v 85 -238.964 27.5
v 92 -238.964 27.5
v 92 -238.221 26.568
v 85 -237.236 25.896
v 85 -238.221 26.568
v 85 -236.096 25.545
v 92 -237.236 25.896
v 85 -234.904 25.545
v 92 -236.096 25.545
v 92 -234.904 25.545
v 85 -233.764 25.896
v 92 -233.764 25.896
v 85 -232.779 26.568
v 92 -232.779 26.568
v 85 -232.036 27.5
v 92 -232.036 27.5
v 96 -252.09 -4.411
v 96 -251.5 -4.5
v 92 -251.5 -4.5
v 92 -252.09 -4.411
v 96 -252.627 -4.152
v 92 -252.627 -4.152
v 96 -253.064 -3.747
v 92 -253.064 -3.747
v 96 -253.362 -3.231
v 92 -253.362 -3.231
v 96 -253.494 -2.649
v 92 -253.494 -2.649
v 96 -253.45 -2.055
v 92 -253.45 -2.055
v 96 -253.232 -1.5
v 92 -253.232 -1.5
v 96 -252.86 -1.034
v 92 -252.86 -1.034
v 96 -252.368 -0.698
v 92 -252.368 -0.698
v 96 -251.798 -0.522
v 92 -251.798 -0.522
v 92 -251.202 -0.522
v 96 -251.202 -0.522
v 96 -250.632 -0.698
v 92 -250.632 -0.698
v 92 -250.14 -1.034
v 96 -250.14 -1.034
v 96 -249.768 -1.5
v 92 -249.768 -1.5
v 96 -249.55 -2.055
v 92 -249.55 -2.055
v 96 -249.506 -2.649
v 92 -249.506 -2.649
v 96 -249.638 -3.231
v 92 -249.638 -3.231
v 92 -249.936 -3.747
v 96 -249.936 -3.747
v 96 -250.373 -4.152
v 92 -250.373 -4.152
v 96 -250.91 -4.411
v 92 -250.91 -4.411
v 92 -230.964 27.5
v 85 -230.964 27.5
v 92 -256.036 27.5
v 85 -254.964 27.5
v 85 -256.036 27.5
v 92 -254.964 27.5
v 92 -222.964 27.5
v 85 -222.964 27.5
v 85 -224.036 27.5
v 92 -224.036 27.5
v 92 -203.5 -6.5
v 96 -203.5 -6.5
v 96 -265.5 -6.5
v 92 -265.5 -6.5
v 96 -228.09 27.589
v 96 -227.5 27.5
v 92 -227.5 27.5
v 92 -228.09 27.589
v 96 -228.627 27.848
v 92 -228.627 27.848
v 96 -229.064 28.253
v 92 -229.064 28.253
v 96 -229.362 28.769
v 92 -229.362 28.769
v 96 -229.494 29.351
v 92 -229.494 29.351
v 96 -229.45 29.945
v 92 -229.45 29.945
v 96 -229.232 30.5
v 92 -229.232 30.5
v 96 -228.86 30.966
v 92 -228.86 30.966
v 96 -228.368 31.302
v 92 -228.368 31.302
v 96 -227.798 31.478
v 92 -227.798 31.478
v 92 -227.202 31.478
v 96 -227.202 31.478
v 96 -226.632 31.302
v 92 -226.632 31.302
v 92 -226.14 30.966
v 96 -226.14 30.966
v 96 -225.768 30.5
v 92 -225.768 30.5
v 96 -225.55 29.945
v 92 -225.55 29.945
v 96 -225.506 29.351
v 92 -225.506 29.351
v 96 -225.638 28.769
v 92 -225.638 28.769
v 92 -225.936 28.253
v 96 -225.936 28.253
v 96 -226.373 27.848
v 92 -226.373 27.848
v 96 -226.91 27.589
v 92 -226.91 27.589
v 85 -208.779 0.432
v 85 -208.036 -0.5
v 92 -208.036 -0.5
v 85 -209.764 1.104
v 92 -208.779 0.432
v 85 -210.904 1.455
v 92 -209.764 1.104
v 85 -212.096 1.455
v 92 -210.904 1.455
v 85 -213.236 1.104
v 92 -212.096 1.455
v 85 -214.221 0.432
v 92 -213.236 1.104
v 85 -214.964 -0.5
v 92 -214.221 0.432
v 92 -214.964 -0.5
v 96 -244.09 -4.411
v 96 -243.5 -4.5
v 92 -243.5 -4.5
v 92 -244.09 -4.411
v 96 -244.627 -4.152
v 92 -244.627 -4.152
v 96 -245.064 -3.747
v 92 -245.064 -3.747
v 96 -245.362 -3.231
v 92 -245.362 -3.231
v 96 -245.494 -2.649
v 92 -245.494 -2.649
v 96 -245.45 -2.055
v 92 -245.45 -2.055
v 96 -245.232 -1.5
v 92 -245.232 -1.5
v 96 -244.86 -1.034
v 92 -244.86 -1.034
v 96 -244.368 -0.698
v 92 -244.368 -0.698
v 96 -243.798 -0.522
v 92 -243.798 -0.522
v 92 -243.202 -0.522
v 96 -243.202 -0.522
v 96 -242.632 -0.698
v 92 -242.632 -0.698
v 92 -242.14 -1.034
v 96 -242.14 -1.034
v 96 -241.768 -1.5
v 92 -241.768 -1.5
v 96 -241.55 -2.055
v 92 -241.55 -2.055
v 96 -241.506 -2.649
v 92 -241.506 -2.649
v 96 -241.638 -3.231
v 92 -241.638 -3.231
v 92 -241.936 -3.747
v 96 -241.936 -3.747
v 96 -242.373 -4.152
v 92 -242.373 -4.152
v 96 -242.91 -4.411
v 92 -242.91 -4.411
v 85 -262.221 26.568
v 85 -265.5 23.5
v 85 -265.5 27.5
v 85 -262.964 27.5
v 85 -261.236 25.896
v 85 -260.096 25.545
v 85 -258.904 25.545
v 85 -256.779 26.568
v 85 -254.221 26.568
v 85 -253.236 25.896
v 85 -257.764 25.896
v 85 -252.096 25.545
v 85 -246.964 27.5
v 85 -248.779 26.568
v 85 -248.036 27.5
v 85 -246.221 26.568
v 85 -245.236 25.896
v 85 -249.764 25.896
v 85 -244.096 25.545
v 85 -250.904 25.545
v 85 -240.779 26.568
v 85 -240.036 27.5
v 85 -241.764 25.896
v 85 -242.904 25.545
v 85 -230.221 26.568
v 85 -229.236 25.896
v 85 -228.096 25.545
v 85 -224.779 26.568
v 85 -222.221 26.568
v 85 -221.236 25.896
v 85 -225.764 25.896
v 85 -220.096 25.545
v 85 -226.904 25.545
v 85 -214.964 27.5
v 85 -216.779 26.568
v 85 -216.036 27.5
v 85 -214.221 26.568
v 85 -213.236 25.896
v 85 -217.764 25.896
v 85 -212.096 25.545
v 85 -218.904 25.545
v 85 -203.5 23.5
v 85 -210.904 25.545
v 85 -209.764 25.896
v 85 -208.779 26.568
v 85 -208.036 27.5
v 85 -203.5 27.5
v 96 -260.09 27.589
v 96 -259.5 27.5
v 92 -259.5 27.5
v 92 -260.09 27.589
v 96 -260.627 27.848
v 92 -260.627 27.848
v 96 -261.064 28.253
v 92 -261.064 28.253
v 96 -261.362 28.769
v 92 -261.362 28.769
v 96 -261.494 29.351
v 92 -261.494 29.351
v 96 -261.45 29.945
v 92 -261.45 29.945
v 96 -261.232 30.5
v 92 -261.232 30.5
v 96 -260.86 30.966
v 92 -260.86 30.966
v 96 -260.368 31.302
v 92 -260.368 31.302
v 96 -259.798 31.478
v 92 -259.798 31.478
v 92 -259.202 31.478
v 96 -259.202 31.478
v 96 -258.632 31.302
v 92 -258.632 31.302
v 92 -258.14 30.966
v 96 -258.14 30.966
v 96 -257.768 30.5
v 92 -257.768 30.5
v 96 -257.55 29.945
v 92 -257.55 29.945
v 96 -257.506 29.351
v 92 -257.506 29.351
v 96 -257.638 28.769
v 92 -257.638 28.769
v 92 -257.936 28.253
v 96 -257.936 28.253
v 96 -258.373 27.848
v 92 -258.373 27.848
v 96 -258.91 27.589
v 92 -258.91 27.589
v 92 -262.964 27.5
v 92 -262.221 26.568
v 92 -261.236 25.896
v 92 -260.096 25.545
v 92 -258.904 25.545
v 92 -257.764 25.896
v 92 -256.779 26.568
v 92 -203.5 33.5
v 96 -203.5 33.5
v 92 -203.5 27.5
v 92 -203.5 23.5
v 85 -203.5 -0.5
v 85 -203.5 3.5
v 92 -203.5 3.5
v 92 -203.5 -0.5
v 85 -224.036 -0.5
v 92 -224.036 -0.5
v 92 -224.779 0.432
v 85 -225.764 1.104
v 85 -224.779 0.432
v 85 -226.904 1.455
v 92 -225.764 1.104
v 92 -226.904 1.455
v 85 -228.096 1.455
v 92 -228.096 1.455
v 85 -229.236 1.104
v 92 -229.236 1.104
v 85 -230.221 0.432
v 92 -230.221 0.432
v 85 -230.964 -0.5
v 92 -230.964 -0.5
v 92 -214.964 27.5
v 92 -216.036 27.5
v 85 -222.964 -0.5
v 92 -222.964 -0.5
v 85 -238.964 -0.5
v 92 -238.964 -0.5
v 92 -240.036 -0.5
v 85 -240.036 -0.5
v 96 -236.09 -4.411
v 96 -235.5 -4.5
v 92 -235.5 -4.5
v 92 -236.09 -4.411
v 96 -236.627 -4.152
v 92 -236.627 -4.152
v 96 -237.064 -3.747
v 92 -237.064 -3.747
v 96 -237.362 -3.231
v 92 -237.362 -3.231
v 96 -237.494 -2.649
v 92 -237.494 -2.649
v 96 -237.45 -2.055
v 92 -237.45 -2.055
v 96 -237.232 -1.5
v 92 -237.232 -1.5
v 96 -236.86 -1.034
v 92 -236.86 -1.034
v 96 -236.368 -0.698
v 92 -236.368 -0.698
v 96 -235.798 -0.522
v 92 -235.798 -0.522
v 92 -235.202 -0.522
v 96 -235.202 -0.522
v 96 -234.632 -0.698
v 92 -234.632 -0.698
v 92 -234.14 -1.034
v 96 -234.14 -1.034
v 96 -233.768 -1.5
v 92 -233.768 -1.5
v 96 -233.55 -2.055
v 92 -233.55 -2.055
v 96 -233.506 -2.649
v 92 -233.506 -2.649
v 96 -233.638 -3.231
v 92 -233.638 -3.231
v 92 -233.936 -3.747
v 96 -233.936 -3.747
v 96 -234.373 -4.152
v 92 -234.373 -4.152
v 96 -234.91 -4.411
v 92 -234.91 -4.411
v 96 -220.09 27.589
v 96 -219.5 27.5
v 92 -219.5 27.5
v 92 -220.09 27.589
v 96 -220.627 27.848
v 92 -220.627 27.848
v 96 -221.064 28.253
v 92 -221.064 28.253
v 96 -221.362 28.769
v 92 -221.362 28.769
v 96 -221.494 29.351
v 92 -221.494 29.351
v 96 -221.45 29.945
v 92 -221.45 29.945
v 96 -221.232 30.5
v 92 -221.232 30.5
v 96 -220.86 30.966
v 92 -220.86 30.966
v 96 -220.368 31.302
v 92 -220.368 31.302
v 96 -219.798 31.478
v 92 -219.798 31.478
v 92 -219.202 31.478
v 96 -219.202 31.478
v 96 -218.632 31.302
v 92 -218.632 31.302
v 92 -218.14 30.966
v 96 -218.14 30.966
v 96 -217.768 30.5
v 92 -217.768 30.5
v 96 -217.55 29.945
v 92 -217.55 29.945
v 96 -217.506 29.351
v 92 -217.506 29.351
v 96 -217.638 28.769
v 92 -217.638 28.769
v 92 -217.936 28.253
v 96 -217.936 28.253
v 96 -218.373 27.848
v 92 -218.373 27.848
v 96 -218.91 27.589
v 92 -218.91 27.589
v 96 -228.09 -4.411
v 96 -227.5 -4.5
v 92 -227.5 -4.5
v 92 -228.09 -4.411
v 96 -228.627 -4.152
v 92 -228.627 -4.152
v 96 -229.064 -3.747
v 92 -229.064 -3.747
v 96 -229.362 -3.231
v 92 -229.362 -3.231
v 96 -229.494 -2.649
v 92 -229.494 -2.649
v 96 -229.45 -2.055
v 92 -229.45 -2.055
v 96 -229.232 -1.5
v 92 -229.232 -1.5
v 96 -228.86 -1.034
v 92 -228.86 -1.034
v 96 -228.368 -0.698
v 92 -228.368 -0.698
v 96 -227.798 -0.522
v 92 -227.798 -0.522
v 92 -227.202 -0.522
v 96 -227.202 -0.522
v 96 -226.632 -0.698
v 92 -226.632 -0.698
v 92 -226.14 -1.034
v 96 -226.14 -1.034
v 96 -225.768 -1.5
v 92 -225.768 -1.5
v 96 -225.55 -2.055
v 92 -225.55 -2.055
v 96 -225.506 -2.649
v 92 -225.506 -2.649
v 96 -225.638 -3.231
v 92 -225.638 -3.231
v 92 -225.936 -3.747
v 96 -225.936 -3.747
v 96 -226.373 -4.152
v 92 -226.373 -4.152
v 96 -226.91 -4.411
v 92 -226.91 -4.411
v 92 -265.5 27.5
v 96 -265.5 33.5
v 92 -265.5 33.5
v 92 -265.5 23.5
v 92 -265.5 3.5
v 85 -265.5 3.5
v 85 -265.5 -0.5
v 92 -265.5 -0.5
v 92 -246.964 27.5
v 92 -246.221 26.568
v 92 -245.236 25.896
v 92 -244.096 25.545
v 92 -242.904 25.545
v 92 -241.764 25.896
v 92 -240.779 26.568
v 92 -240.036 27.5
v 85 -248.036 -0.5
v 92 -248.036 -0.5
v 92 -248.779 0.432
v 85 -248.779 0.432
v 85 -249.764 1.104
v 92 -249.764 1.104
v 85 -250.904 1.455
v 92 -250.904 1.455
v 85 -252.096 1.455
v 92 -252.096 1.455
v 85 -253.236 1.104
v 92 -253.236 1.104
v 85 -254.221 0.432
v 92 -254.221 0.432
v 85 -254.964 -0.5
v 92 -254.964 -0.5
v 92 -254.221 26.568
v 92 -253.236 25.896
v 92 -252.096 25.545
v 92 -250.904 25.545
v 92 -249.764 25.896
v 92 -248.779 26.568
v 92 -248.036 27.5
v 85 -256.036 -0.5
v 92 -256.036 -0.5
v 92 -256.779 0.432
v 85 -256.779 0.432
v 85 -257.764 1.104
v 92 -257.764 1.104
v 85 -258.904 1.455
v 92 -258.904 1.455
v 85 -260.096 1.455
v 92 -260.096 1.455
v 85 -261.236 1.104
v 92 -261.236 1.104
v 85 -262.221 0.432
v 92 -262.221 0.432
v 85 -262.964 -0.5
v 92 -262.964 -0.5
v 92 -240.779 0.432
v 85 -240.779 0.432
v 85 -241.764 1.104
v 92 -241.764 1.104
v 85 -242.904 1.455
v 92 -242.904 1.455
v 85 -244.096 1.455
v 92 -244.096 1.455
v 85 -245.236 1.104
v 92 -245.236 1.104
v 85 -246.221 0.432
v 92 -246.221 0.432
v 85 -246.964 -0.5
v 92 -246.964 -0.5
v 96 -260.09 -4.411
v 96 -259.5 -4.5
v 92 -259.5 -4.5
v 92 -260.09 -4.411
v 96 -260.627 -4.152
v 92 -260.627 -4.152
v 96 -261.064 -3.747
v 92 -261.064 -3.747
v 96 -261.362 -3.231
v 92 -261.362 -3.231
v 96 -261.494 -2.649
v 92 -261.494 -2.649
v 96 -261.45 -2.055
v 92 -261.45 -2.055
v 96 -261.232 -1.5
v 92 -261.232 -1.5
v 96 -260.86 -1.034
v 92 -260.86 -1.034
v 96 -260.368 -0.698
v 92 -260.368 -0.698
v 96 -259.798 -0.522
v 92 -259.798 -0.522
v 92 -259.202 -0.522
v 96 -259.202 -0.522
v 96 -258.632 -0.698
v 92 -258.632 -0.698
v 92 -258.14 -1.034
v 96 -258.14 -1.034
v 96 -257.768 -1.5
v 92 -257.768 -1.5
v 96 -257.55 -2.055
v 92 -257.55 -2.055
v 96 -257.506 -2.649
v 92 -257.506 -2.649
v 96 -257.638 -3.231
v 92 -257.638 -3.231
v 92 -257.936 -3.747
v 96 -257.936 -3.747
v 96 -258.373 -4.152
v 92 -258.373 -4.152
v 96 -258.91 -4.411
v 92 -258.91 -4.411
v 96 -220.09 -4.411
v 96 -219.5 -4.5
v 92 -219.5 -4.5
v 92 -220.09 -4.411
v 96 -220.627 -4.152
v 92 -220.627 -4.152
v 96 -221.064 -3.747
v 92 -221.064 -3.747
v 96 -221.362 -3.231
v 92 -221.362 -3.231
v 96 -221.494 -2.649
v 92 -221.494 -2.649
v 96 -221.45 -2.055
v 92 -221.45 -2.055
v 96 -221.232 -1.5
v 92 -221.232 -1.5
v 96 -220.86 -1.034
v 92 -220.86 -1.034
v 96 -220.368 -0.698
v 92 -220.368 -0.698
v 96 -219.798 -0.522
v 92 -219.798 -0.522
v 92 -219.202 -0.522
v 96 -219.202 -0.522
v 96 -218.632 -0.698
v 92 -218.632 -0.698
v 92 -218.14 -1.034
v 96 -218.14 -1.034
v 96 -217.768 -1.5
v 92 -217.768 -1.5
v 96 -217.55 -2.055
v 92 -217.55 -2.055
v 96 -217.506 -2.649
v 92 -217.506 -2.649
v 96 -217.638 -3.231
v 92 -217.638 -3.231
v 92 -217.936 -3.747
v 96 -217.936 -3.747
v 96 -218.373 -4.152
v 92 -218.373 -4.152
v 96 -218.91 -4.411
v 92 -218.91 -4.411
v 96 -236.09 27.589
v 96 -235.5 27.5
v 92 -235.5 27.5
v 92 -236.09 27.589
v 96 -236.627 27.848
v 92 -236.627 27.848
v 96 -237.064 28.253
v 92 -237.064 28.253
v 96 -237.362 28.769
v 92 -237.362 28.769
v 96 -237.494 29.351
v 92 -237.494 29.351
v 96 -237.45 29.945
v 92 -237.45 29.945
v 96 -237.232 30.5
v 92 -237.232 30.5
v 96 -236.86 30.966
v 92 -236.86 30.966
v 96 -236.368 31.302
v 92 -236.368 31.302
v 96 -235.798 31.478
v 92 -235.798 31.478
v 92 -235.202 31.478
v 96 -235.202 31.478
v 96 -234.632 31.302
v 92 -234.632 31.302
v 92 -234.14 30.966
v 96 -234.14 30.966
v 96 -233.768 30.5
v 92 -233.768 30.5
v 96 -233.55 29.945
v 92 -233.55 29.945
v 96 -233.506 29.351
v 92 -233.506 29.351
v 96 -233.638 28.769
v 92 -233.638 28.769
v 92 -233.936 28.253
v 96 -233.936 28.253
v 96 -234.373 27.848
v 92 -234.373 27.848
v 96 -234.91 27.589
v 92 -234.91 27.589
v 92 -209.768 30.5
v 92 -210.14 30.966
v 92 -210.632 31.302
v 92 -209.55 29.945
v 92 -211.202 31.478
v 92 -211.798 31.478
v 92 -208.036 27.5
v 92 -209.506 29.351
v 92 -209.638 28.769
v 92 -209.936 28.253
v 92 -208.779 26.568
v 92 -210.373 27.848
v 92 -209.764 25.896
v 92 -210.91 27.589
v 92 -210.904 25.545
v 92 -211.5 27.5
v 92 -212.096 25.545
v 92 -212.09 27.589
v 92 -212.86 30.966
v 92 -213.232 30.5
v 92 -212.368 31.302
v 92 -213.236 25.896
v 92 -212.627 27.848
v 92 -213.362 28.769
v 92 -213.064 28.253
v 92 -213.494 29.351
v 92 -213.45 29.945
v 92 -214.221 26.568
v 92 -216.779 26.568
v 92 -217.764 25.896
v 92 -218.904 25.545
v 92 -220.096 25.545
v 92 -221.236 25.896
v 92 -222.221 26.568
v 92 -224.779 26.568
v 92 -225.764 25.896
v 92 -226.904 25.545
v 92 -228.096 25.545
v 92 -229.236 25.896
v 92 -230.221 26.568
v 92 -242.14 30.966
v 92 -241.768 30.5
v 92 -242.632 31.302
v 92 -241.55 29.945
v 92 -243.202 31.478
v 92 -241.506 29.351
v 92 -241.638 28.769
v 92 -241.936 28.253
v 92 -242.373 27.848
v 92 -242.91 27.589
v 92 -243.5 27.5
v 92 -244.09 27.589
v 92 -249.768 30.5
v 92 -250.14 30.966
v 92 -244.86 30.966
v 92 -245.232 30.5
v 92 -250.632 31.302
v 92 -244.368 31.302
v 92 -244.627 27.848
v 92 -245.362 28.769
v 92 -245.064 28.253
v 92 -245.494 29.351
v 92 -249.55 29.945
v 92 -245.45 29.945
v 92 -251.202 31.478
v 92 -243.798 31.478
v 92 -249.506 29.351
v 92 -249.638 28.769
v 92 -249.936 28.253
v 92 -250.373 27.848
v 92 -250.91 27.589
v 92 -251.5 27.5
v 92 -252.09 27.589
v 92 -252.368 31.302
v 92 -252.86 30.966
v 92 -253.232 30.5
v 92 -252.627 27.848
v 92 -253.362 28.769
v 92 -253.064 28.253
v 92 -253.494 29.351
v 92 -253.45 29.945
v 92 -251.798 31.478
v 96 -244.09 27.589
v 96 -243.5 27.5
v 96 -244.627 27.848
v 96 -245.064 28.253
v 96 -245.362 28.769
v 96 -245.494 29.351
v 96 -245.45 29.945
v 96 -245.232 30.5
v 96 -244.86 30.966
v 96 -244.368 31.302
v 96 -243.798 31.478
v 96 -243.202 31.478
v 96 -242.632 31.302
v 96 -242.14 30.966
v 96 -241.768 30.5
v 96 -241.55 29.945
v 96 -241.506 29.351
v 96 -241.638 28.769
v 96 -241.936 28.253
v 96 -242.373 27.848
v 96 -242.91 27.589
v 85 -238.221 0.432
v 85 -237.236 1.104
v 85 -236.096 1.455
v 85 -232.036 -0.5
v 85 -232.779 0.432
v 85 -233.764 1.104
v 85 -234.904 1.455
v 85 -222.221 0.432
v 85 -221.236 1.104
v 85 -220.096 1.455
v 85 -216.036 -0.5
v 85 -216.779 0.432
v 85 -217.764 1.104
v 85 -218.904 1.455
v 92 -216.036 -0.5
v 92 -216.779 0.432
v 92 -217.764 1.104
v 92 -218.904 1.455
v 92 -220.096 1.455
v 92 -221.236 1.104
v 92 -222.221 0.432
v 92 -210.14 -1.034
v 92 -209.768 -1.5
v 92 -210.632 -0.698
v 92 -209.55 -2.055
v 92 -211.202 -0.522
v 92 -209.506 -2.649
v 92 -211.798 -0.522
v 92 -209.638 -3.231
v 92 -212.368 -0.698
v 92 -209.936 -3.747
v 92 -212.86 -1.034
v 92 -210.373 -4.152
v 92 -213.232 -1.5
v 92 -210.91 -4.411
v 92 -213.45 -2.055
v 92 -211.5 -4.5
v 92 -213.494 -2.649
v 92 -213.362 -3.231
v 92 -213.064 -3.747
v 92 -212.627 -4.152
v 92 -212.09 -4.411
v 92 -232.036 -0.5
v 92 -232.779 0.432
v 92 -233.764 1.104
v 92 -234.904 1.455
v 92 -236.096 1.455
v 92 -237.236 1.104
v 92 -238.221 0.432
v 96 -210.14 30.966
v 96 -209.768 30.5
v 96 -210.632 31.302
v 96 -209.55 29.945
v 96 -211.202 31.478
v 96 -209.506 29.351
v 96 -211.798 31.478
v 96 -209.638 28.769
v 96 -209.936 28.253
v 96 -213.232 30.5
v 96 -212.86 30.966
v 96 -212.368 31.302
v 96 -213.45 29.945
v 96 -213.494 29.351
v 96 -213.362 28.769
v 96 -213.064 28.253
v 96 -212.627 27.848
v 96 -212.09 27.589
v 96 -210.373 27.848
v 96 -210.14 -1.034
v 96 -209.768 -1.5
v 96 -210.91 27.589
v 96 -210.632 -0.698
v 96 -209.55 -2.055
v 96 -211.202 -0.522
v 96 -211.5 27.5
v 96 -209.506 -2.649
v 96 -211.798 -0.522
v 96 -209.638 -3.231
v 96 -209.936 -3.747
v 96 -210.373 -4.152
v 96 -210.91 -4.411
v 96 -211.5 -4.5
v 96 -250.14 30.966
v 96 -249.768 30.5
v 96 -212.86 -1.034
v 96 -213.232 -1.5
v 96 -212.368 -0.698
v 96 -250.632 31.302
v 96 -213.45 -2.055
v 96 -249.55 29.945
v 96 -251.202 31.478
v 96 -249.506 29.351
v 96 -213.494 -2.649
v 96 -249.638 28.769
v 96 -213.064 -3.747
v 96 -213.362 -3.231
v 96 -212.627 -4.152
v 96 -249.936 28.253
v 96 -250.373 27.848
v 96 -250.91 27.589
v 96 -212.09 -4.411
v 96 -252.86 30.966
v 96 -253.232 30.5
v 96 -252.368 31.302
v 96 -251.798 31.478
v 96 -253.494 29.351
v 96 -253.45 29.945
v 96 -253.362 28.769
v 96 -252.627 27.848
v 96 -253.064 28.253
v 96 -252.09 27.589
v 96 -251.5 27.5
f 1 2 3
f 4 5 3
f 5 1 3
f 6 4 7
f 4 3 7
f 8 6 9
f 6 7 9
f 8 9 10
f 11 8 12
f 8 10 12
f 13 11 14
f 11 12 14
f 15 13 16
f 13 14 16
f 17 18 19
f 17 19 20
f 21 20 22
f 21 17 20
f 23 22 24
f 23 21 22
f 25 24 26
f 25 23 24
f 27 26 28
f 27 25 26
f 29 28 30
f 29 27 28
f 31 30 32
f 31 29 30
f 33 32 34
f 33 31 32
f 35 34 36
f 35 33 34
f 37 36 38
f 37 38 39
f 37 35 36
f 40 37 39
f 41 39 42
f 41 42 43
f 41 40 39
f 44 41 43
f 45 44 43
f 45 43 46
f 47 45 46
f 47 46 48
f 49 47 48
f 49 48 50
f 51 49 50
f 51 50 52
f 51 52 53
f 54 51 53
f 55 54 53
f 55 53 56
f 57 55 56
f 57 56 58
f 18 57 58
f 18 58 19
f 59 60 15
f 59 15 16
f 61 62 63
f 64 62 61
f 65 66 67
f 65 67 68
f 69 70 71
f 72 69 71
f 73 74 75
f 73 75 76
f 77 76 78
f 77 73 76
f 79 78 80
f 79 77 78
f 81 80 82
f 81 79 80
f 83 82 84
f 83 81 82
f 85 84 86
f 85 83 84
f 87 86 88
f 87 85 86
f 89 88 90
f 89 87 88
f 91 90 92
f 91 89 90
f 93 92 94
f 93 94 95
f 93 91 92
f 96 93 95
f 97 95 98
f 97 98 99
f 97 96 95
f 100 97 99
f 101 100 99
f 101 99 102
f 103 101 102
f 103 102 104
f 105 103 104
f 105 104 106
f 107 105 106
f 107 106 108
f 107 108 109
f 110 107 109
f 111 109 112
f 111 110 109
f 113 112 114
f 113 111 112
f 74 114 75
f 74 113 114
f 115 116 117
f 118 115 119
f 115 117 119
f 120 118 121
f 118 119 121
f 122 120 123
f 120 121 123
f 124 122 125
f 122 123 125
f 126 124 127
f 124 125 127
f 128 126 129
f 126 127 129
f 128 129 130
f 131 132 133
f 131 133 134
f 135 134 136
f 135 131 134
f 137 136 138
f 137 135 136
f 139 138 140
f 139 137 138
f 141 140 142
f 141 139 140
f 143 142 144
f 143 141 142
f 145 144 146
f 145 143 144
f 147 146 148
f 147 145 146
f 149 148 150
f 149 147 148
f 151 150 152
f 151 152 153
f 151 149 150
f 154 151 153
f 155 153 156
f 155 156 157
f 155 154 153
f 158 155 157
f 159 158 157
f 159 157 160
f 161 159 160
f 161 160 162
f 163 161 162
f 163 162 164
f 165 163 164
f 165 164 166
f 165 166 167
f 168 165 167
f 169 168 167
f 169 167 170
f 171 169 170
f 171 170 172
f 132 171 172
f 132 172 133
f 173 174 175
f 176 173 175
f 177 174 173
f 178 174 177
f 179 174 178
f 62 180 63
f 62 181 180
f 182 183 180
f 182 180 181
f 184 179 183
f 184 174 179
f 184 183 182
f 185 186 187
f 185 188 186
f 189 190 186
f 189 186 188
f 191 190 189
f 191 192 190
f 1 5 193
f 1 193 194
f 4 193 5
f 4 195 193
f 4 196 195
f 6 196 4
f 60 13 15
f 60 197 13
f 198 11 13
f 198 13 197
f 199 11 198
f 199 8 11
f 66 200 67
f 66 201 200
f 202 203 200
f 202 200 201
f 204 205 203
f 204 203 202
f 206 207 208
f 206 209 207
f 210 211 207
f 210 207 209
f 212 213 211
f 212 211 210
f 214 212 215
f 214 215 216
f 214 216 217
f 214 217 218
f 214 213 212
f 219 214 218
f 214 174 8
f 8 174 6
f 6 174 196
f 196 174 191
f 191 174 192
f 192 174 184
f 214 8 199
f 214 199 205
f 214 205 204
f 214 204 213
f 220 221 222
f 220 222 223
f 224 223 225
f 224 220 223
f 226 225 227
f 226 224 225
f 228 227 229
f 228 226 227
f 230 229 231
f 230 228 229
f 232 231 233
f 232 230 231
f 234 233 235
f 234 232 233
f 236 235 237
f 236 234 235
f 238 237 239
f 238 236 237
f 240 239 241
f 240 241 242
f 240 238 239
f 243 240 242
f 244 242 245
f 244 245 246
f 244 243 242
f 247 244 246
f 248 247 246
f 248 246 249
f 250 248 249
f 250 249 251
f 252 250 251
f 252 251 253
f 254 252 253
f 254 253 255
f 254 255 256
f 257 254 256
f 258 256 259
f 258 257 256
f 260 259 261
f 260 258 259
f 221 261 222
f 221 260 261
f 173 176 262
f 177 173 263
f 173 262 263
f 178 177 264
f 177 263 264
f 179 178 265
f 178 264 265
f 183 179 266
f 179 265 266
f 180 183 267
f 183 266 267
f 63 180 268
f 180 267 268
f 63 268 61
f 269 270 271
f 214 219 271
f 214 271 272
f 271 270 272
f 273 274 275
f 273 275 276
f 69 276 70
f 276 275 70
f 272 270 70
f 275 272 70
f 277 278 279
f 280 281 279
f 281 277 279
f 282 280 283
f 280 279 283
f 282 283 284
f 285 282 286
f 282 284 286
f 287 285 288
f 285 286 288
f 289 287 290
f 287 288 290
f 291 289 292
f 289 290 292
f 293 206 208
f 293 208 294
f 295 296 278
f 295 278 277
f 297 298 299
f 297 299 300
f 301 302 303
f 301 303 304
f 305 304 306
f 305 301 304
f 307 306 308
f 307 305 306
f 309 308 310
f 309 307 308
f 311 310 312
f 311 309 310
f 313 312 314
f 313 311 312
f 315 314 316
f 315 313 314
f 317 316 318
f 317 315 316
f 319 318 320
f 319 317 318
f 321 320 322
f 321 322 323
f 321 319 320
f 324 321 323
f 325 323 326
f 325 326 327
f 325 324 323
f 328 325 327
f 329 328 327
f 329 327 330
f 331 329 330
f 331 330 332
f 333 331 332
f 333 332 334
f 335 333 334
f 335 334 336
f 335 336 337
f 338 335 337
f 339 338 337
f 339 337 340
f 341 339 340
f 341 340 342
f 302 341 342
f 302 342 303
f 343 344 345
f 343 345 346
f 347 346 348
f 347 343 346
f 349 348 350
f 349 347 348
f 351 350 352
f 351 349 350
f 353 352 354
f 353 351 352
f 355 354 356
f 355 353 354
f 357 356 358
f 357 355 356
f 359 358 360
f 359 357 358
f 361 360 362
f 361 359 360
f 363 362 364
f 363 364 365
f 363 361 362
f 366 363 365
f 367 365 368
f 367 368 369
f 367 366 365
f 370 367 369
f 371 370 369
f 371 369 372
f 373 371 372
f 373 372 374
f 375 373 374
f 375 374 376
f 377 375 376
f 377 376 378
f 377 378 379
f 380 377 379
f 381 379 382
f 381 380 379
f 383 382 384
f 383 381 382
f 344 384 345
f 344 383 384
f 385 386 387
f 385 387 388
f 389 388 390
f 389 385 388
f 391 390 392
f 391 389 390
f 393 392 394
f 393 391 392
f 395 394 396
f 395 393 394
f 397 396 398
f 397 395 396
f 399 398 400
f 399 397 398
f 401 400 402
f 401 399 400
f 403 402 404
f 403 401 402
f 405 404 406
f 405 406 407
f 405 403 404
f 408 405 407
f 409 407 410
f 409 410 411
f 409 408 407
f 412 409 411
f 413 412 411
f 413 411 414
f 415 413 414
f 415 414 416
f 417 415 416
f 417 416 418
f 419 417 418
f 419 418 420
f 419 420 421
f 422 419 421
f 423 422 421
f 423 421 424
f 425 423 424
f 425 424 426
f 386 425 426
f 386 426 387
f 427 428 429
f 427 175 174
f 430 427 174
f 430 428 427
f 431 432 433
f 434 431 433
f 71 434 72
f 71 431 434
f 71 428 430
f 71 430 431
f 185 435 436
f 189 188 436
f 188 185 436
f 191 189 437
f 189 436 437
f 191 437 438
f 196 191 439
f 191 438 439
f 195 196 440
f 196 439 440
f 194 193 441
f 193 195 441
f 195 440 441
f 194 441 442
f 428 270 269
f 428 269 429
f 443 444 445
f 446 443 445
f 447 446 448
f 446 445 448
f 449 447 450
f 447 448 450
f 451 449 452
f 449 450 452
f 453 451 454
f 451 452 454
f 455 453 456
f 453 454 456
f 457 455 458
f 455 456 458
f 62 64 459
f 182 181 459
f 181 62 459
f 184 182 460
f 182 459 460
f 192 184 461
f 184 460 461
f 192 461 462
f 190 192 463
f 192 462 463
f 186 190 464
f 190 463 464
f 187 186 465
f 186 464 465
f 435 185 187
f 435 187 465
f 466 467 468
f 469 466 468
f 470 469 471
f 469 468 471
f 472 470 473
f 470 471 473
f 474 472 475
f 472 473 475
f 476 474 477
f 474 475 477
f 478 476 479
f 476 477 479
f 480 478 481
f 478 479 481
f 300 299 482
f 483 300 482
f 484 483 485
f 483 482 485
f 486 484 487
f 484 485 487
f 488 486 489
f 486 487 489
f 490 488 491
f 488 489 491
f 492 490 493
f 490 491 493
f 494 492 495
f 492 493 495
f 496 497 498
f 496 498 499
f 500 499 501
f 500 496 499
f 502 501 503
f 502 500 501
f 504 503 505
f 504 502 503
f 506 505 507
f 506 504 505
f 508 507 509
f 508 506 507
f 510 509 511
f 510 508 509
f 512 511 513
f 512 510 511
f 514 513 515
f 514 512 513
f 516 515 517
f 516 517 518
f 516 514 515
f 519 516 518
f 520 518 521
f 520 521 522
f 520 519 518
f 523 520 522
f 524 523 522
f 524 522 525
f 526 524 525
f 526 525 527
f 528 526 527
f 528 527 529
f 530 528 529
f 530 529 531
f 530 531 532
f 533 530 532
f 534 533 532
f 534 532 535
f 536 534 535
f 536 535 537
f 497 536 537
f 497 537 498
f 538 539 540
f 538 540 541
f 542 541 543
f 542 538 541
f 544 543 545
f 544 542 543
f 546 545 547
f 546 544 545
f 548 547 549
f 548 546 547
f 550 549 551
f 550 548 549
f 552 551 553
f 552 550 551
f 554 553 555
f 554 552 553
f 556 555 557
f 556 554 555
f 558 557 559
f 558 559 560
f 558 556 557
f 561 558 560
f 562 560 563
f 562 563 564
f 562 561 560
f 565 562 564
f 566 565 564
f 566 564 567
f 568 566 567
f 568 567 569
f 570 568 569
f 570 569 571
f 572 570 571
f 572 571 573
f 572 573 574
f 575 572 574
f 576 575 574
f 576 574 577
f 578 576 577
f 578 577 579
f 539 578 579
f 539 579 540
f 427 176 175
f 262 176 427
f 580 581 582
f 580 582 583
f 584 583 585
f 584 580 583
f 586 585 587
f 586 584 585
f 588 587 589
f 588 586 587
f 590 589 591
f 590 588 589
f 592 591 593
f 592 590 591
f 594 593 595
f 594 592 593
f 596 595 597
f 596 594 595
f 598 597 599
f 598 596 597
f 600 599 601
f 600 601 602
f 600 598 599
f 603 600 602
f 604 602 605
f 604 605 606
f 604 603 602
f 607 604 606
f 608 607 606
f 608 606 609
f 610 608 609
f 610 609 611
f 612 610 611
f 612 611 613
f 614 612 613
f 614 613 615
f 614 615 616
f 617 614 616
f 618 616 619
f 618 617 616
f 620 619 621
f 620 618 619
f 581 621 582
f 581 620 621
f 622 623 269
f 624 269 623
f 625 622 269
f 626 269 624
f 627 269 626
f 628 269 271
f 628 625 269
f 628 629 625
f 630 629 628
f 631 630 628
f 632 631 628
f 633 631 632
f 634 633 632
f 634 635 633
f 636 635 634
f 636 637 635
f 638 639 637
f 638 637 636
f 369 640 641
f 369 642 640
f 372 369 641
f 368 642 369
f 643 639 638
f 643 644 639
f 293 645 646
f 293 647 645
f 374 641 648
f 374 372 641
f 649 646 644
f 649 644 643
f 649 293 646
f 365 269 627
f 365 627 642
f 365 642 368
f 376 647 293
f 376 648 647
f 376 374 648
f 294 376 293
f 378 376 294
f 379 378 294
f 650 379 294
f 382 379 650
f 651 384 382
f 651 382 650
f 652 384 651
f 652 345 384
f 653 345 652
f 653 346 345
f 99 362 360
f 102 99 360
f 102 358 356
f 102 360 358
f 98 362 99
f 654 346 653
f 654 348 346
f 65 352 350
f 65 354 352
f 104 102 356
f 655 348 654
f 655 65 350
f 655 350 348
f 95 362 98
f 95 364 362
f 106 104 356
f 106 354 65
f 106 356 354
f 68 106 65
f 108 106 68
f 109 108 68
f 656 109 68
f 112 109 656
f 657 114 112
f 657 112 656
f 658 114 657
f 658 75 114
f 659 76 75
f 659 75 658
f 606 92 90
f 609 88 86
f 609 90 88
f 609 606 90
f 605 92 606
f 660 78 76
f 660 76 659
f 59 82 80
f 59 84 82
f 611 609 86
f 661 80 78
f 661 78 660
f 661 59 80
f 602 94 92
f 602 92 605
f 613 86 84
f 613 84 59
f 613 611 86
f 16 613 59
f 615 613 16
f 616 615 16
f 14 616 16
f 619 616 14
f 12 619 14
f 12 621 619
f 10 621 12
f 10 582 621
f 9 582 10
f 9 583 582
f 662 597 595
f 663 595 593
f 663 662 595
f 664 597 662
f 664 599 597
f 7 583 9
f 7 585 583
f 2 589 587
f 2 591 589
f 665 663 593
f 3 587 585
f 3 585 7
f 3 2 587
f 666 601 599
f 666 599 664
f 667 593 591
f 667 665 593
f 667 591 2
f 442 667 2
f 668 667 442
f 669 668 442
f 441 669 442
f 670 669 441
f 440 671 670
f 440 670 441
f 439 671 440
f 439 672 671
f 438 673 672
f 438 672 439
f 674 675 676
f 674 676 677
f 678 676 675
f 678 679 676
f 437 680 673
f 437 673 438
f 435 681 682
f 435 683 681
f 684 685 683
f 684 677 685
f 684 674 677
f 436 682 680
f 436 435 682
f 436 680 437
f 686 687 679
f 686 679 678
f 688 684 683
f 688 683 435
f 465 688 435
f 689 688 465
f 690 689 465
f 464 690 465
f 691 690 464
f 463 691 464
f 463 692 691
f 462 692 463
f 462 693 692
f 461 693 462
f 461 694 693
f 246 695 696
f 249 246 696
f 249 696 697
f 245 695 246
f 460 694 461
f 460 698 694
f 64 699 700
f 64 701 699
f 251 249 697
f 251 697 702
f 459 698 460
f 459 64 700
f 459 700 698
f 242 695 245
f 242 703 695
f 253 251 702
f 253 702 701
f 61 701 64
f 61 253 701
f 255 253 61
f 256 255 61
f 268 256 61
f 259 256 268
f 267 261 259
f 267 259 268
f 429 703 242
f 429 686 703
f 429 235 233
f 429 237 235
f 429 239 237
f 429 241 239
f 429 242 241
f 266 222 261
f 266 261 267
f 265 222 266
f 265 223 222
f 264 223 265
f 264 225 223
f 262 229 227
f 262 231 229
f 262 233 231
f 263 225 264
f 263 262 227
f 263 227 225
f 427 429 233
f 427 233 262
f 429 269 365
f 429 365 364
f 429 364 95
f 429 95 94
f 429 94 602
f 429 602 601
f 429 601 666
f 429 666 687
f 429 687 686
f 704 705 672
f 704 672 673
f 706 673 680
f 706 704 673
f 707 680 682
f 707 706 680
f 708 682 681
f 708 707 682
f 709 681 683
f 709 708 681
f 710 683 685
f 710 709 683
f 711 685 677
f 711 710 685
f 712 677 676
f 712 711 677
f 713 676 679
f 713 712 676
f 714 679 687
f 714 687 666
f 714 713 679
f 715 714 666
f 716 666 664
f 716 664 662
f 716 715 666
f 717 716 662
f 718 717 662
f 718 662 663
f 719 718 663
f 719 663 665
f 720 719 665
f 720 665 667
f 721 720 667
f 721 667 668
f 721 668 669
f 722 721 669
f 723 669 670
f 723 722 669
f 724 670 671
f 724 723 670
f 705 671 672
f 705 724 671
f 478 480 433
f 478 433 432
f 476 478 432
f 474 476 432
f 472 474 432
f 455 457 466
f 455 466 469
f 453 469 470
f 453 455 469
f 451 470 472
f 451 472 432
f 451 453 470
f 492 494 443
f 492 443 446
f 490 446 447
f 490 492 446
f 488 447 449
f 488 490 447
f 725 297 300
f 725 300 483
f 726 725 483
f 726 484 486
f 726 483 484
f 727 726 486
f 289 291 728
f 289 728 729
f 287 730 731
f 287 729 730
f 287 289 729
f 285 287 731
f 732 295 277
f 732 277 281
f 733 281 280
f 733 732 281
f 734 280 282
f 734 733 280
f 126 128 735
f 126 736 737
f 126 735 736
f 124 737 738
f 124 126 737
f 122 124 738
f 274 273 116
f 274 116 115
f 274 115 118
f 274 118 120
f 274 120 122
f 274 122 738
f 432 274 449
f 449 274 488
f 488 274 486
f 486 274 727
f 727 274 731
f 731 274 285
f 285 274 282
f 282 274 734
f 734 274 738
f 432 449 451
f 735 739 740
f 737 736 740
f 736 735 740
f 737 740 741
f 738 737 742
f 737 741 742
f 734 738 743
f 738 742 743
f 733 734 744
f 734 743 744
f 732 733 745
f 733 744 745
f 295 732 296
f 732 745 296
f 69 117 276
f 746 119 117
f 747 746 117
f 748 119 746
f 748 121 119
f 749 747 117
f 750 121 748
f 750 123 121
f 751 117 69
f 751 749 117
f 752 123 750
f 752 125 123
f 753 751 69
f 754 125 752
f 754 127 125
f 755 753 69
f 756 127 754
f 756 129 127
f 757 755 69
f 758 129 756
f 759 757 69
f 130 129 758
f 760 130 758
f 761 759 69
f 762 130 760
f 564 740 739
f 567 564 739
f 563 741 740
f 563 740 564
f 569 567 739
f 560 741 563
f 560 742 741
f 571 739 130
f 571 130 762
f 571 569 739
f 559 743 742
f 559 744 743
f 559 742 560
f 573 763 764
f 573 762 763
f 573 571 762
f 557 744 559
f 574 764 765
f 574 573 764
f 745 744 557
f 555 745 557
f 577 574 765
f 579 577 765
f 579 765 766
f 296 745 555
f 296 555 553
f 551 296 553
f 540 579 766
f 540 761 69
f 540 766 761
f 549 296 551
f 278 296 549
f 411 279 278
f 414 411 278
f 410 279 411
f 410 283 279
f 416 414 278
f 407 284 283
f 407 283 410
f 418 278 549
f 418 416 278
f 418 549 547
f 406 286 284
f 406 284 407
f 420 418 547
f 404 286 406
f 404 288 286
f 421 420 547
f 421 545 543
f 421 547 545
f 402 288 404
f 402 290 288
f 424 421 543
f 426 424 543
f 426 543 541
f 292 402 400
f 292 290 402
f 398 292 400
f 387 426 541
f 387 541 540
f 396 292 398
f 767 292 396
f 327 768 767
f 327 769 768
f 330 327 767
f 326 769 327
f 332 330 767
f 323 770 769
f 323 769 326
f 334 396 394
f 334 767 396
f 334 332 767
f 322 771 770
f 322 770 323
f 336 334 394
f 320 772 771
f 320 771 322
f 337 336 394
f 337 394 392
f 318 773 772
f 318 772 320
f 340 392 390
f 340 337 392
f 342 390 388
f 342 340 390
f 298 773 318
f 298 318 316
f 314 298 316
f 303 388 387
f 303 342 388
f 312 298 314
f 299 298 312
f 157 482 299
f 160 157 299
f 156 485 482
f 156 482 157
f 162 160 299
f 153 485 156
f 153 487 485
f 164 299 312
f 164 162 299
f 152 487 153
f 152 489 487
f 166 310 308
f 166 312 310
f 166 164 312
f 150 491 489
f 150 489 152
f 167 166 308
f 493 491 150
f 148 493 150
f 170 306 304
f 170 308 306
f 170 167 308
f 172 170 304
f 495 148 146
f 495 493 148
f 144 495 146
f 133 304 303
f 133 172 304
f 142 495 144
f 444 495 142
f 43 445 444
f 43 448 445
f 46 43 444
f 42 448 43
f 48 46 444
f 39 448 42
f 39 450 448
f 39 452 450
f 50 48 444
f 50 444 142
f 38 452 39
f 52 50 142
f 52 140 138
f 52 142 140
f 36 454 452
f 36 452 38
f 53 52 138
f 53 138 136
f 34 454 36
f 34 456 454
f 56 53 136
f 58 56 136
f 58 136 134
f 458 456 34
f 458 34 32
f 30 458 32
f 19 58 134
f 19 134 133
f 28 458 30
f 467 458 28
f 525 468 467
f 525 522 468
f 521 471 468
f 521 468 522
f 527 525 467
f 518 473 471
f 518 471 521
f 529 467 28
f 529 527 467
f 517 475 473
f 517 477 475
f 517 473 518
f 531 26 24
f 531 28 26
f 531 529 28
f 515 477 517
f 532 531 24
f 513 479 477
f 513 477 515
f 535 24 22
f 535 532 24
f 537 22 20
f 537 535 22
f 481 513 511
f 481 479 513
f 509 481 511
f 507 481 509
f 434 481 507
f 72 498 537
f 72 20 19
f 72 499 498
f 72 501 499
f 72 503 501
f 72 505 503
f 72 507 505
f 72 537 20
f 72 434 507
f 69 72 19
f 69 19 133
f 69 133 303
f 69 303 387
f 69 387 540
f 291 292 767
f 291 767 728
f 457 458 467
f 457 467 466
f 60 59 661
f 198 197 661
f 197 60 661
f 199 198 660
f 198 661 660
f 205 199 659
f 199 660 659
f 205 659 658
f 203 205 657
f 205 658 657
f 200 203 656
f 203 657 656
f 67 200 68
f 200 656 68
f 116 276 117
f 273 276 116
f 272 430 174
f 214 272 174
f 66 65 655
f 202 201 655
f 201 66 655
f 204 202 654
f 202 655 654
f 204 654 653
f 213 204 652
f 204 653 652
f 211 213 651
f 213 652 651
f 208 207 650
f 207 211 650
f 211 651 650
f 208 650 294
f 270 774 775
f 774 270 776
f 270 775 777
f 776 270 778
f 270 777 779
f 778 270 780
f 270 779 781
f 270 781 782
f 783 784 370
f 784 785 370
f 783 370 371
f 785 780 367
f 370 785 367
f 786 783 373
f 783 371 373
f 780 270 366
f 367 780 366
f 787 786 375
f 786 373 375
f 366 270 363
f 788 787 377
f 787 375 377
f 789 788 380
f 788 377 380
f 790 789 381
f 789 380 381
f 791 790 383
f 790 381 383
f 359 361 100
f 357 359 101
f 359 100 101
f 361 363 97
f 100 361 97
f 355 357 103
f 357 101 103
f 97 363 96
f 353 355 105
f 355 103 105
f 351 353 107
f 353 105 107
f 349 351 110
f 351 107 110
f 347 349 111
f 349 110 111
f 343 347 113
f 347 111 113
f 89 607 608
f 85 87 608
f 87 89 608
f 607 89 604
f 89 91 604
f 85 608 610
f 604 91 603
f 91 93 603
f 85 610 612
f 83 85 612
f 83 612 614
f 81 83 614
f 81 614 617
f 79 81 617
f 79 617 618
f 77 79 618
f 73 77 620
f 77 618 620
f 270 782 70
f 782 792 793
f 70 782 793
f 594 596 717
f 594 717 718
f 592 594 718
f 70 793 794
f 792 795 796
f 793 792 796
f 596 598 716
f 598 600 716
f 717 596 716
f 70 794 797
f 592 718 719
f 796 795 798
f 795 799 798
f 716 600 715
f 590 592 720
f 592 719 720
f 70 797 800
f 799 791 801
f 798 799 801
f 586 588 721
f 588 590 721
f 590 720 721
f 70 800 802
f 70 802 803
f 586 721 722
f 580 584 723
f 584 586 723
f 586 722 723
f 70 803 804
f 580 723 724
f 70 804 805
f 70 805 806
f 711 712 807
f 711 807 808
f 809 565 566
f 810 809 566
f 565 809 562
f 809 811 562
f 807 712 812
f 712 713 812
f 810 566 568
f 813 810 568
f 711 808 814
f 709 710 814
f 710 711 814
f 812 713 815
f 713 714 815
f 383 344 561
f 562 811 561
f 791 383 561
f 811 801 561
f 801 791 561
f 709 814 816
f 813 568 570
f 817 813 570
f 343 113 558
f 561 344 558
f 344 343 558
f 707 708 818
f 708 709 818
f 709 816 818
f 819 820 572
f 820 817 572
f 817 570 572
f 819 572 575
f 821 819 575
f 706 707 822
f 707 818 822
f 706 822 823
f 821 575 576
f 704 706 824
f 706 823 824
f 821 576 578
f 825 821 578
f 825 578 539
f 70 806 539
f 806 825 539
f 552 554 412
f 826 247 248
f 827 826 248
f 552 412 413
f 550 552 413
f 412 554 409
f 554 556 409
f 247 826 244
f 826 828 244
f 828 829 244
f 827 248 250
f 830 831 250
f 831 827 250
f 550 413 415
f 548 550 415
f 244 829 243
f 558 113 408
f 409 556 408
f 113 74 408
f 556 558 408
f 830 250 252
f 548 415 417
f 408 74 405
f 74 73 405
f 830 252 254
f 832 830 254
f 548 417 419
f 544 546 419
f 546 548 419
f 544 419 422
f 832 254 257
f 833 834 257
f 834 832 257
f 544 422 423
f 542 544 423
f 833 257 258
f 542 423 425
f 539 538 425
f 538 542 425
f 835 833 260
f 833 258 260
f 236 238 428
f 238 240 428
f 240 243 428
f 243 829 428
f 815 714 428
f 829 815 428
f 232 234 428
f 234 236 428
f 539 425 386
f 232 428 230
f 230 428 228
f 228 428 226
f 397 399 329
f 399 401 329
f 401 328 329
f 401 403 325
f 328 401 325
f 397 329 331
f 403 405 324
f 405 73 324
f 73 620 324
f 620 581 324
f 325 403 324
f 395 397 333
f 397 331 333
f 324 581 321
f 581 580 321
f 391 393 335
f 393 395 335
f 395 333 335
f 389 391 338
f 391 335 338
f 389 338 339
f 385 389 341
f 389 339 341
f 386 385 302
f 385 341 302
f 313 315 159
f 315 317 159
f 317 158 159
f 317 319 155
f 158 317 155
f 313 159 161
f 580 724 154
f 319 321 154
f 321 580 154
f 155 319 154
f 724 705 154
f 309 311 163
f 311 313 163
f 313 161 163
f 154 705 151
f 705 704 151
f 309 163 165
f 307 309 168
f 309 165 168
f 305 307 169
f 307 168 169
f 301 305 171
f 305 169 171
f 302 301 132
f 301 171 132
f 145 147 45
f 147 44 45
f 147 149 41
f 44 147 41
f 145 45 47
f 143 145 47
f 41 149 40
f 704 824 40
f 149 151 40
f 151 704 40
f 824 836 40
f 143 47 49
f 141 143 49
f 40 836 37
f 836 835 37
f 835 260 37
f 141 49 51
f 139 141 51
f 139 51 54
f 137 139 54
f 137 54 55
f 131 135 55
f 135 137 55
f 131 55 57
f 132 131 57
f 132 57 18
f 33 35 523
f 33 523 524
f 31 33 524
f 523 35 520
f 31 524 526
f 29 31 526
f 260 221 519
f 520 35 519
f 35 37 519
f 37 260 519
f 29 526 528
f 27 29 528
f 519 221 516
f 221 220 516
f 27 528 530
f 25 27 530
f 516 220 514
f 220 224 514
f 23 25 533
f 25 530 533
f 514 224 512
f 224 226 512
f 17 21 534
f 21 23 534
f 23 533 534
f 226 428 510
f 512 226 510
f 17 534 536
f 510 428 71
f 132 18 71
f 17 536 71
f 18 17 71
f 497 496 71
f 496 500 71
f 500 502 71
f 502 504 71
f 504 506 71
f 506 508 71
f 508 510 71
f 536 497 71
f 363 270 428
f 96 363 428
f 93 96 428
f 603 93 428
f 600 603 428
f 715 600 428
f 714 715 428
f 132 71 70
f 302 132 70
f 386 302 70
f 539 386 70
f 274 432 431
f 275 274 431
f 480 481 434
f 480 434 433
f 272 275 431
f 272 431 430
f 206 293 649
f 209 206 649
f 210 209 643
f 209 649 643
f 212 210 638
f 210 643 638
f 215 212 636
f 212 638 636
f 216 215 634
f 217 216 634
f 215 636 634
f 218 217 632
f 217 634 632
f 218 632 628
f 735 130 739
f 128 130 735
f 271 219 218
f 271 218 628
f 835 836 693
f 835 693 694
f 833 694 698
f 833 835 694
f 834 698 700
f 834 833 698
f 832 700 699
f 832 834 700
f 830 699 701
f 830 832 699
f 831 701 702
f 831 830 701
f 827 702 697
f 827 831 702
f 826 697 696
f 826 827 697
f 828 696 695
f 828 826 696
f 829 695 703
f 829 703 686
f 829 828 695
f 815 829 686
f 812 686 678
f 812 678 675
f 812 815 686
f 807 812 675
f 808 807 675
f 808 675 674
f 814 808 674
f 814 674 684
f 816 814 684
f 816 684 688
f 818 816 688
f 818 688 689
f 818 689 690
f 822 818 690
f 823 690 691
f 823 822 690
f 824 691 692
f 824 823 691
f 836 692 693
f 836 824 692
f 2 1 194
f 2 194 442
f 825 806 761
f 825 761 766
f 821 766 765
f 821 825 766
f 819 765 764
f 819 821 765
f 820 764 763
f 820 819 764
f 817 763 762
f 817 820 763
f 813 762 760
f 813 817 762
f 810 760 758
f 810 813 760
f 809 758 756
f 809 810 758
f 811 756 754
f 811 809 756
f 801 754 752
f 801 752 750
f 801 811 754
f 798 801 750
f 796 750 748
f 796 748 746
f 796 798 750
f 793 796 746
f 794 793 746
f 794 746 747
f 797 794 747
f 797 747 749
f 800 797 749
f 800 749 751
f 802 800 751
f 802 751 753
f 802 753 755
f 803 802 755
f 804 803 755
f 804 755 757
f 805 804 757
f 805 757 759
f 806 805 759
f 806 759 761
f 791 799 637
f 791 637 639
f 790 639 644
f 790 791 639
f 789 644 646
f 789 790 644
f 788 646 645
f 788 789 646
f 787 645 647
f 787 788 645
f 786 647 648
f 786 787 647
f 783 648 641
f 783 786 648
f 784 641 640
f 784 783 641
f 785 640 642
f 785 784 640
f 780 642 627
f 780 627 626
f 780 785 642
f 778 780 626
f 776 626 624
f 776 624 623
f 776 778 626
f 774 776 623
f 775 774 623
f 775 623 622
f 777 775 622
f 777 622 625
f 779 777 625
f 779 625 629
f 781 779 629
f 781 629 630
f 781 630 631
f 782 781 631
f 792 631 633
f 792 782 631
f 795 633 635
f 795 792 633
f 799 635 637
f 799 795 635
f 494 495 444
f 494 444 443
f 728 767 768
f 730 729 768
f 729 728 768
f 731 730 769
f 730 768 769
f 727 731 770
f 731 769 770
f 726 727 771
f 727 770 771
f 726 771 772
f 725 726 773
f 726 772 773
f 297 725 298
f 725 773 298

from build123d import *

# Parameters (mm, degrees)
PAD028_DEPTH    = 62
SKETCH049_W     = 40
SKETCH049_H     = 62
PAD029_DEPTH    = 4
SKETCH009_R     = 2
POCKET017_DEPTH = 4
SKETCH010_R     = 4
POCKET018_DEPTH = 7


with BuildPart() as leftmiddle:
    # Sketch048 → Pad028 (new body)
    with BuildSketch(Plane.XZ):
        Polygon((0, 0), (0, 10), (7, 10), (7, 14), (-4, 14), (-4, -14), (7, -14), (7, -10), (0, -10), align=None)
    extrude(amount=PAD028_DEPTH)

    # Sketch049 (on Face4 of Pad028) → Pad029 (join)
    with BuildSketch(Plane(origin=(-4, 0, 0), x_dir=(0, 0, -1), z_dir=(-1, 0, 0))):
        with Locations((0, 31)):
            Rectangle(SKETCH049_W, SKETCH049_H)
    extrude(amount=-PAD029_DEPTH)

    # Sketch009 (on Face14 of Pad029) → Pocket017 (cut)
    with BuildSketch(Plane(origin=(-4, 0, 0), x_dir=(0, 0, -1), z_dir=(-1, 0, 0))):
        with Locations((-16, 8)):
            Circle(SKETCH009_R)
        with Locations((-16, 16)):
            Circle(SKETCH009_R)
        with Locations((-16, 24)):
            Circle(SKETCH009_R)
        with Locations((-16, 32)):
            Circle(SKETCH009_R)
        with Locations((-16, 40)):
            Circle(SKETCH009_R)
        with Locations((-16, 48)):
            Circle(SKETCH009_R)
        with Locations((-16, 56)):
            Circle(SKETCH009_R)
        with Locations((16, 56)):
            Circle(SKETCH009_R)
        with Locations((16, 48)):
            Circle(SKETCH009_R)
        with Locations((16, 40)):
            Circle(SKETCH009_R)
        with Locations((16, 32)):
            Circle(SKETCH009_R)
        with Locations((16, 24)):
            Circle(SKETCH009_R)
        with Locations((16, 16)):
            Circle(SKETCH009_R)
        with Locations((16, 8)):
            Circle(SKETCH009_R)
    extrude(amount=-POCKET017_DEPTH, mode=Mode.SUBTRACT)

    # Sketch010 (on Face14 of Pocket017) → Pocket018 (cut)
    with BuildSketch(Plane(origin=(0, 0, 0), x_dir=(0, 0, 1), z_dir=(1, 0, 0))):
        with Locations((-16, 8)):
            Circle(SKETCH010_R)
        with Locations((-16, 16)):
            Circle(SKETCH010_R)
        with Locations((-16, 24)):
            Circle(SKETCH010_R)
        with Locations((-16, 32)):
            Circle(SKETCH010_R)
        with Locations((-16, 40)):
            Circle(SKETCH010_R)
        with Locations((-16, 48)):
            Circle(SKETCH010_R)
        with Locations((-16, 56)):
            Circle(SKETCH010_R)
        with Locations((16, 56)):
            Circle(SKETCH010_R)
        with Locations((16, 48)):
            Circle(SKETCH010_R)
        with Locations((16, 40)):
            Circle(SKETCH010_R)
        with Locations((16, 32)):
            Circle(SKETCH010_R)
        with Locations((16, 24)):
            Circle(SKETCH010_R)
        with Locations((16, 16)):
            Circle(SKETCH010_R)
        with Locations((16, 8)):
            Circle(SKETCH010_R)
    extrude(amount=POCKET018_DEPTH, mode=Mode.SUBTRACT)


with BuildPart() as leftmiddle_1:
    # Body015 placement: moved
    add(leftmiddle.part.moved(Location((-92, -203.5, 13.5))))


with BuildPart() as rightmiddle:
    # Part__Mirroring005: instance of LeftMiddle
    add(leftmiddle_1.part.mirror(Plane(origin=(0, 0, 0), x_dir=(0, -1, 0), z_dir=(1, 0, 0))))


solid = rightmiddle.part
